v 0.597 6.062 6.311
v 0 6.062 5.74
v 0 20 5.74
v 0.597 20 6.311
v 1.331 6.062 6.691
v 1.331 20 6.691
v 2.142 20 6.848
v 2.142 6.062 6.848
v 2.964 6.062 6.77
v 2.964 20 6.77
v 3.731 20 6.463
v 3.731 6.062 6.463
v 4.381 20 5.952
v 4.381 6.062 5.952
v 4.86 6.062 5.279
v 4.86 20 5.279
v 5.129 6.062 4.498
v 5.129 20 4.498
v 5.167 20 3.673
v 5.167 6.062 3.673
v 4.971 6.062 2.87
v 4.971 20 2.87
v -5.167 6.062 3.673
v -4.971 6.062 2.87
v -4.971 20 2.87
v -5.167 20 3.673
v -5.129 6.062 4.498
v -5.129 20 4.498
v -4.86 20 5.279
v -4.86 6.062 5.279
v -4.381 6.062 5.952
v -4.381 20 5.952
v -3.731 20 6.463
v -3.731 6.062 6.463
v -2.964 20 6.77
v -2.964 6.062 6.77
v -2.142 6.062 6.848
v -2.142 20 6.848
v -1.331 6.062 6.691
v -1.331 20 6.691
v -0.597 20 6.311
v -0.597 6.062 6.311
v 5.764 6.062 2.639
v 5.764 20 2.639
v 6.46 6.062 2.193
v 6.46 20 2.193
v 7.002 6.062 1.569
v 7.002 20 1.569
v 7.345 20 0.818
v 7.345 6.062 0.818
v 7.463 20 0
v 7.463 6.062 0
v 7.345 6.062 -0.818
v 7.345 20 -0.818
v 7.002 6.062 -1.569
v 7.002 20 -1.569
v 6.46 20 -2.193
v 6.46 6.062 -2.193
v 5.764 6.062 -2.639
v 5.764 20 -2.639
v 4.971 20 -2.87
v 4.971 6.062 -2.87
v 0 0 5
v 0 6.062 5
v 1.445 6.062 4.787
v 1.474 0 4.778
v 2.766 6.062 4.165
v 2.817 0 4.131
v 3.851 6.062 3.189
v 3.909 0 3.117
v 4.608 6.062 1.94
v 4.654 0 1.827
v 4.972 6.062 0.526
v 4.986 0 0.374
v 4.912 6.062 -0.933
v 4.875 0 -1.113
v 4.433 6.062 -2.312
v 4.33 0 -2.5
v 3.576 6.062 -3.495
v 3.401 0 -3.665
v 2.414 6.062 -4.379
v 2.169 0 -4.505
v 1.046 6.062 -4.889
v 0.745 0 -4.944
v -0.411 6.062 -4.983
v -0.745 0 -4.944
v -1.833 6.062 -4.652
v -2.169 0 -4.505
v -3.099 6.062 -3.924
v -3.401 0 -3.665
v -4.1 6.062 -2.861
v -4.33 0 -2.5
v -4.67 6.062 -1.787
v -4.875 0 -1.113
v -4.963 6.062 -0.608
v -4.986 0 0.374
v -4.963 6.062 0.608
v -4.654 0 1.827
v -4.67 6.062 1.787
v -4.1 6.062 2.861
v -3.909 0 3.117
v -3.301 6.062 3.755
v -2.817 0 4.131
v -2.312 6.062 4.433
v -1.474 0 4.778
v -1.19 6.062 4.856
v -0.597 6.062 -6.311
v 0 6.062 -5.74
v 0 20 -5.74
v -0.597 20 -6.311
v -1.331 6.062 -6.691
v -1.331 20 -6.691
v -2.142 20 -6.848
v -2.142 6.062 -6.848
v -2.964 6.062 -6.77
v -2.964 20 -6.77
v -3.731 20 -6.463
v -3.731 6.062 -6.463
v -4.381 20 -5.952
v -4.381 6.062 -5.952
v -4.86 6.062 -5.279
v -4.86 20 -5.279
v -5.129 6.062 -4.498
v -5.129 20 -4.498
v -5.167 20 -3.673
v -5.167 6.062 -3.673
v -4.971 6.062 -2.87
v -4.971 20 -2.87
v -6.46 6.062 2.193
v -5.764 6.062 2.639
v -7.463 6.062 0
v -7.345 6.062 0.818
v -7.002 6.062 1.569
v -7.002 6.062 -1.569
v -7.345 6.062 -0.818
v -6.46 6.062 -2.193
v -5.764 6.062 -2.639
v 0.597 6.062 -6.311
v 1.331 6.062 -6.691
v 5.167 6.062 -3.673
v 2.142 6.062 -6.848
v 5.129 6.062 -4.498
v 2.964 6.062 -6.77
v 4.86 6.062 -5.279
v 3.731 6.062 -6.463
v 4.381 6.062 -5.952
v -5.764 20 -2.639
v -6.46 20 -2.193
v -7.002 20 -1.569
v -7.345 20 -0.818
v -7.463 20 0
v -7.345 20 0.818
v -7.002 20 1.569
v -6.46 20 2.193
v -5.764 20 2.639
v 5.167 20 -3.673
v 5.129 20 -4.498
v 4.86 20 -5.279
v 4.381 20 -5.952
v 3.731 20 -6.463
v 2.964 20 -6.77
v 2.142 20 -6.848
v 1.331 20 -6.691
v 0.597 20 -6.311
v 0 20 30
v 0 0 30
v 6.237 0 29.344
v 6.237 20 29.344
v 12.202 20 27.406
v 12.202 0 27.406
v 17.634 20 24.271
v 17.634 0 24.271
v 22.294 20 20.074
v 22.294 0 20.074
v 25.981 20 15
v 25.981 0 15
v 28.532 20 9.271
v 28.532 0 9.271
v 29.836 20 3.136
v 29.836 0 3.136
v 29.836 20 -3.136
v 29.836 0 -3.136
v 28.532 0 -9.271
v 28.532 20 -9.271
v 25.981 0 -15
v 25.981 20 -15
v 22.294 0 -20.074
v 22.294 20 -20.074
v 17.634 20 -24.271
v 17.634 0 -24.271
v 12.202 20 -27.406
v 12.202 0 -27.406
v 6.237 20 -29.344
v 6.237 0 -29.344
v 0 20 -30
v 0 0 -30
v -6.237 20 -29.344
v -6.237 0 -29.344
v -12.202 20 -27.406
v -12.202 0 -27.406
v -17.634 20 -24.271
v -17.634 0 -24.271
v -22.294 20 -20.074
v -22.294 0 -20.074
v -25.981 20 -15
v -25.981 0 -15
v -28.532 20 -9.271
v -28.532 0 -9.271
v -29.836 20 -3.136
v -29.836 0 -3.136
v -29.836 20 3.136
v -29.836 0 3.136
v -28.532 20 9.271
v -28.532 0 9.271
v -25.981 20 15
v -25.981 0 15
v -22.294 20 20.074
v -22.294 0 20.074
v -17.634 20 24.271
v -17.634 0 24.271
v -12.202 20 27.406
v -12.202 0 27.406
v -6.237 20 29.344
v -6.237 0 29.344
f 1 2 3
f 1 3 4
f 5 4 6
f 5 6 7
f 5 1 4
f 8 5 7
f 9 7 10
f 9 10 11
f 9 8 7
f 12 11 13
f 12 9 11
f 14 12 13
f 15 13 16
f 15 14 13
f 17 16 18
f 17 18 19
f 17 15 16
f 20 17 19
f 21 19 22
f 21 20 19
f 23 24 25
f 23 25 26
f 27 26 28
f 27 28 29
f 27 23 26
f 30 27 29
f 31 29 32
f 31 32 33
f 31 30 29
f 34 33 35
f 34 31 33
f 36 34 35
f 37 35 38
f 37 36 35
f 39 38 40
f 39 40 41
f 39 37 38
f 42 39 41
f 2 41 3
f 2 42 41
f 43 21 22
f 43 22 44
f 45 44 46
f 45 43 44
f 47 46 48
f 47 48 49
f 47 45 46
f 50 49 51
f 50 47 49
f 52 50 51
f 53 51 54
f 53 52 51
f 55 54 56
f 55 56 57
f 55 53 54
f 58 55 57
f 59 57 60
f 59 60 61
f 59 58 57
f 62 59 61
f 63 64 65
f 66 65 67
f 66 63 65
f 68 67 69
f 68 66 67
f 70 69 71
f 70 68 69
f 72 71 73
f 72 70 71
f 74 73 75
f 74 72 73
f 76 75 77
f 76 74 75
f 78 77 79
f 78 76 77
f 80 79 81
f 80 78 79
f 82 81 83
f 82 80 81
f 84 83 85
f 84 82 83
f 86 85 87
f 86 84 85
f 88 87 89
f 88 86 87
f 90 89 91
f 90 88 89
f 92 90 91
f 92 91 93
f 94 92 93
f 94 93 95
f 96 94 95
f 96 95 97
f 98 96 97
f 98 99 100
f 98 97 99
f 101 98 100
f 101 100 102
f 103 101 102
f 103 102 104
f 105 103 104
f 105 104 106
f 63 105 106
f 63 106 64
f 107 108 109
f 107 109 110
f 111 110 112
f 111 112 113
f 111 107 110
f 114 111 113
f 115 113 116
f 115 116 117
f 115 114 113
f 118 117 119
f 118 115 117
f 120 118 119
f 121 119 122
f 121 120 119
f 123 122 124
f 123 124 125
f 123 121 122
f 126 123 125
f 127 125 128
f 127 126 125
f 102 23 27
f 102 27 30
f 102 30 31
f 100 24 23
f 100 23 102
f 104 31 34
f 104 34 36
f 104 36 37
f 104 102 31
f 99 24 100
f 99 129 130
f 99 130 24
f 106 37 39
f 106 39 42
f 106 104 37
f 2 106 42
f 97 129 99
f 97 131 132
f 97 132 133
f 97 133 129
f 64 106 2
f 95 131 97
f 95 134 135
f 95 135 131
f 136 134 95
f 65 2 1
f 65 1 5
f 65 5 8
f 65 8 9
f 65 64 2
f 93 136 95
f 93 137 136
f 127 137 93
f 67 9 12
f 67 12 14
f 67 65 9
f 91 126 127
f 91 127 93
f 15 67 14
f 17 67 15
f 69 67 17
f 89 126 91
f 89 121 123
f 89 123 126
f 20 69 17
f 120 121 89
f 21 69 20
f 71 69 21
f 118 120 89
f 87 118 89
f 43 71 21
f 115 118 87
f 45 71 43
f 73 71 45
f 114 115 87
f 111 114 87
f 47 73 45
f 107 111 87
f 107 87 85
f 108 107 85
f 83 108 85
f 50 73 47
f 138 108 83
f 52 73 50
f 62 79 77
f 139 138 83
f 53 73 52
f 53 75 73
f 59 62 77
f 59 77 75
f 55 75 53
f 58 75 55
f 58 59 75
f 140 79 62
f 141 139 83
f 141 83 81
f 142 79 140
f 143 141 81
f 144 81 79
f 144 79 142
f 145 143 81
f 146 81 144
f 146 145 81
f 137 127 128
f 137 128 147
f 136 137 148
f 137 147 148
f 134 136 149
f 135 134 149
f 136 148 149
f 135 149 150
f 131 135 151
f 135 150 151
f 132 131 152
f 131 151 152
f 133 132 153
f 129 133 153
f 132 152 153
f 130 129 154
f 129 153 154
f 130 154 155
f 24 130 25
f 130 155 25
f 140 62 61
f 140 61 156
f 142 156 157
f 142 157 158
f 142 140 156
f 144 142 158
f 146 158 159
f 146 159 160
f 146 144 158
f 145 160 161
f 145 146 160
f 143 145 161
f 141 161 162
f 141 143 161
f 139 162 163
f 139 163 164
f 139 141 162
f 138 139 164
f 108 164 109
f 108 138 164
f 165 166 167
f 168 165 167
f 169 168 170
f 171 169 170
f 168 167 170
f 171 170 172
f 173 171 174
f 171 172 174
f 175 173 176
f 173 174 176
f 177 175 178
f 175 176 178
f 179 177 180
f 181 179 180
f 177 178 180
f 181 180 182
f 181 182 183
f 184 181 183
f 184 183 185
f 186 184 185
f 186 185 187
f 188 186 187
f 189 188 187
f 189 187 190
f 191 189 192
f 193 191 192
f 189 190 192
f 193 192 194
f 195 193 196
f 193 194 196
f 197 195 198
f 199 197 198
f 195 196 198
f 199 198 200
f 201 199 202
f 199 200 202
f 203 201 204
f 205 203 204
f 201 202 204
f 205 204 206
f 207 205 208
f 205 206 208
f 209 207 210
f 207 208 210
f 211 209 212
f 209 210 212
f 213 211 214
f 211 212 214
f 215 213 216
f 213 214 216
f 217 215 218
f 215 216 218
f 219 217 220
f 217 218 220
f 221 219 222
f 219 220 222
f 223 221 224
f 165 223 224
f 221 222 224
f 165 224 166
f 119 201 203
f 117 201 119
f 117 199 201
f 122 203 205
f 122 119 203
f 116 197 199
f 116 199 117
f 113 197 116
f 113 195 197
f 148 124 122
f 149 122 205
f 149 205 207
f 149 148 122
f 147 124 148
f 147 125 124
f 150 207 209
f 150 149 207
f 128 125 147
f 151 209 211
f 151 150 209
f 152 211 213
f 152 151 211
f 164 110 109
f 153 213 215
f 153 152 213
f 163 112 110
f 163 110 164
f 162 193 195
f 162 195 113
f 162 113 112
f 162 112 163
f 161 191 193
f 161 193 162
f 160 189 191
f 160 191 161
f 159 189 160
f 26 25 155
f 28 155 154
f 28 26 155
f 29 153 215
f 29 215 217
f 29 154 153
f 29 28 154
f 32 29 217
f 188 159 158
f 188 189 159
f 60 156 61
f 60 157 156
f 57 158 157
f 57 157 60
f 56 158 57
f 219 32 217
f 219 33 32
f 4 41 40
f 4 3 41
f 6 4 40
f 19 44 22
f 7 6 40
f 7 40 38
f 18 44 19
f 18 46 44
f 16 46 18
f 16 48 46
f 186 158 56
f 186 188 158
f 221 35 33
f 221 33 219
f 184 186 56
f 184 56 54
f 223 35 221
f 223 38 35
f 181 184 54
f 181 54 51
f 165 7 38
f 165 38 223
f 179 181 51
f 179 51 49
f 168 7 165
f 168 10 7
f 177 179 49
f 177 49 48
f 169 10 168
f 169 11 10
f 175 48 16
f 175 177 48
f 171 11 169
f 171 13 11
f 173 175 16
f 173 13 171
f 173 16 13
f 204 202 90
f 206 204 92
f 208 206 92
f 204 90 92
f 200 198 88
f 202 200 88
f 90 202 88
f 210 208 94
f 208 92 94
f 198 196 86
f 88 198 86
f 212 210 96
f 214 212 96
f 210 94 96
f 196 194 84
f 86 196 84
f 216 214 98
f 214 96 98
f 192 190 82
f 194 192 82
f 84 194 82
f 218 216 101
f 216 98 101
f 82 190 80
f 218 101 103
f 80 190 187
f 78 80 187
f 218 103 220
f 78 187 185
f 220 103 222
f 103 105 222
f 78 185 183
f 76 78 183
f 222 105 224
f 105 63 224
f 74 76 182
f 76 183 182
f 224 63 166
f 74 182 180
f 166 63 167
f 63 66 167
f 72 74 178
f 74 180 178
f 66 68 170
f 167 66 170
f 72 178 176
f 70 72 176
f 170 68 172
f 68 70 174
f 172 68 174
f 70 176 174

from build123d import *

# Parameters (mm, degrees)
SKETCH1_R           = 30
BOSS_EXTRUDE1_DEPTH = 20
SKETCH2_R           = 5
CUT_EXTRUDE1_DEPTH  = 47.904157598
SKETCH3_R           = 2.898603643
CUT_EXTRUDE2_DEPTH  = 13.937500009
CIRPATTERN1_COUNT   = 6


with BuildPart() as part:
    # Sketch1 → Boss-Extrude1 (new body)
    with BuildSketch(Plane(origin=(0, 0, 0), x_dir=(1, 0, 0), z_dir=(0, 1, 0))):
        Circle(SKETCH1_R)
    extrude(amount=BOSS_EXTRUDE1_DEPTH)

    # Sketch2 → Cut-Extrude1 (cut, through all)
    with BuildSketch(Plane(origin=(0, 0, 0), x_dir=(1, 0, 0), z_dir=(0, 1, 0))):
        Circle(SKETCH2_R)
    extrude(amount=CUT_EXTRUDE1_DEPTH, mode=Mode.SUBTRACT)

    # Sketch3 → Cut-Extrude2 (cut)
    with BuildSketch(Plane(origin=(0, 20, 0), x_dir=(1, 0, 0), z_dir=(0, 1, 0))):
        with Locations((-4.564381882, 0)):
            Circle(SKETCH3_R)
    cut_extrude2 = extrude(amount=-CUT_EXTRUDE2_DEPTH, mode=Mode.SUBTRACT)

    # CirPattern1: Cut-Extrude2 ×6 about axis
    cirpattern1_axis = Axis((0, 0, 0), (0, 1, 0))
    for i in range(1, CIRPATTERN1_COUNT):
        add(cut_extrude2.rotate(cirpattern1_axis, i * 360 / CIRPATTERN1_COUNT), mode=Mode.SUBTRACT)


solid = part.part
